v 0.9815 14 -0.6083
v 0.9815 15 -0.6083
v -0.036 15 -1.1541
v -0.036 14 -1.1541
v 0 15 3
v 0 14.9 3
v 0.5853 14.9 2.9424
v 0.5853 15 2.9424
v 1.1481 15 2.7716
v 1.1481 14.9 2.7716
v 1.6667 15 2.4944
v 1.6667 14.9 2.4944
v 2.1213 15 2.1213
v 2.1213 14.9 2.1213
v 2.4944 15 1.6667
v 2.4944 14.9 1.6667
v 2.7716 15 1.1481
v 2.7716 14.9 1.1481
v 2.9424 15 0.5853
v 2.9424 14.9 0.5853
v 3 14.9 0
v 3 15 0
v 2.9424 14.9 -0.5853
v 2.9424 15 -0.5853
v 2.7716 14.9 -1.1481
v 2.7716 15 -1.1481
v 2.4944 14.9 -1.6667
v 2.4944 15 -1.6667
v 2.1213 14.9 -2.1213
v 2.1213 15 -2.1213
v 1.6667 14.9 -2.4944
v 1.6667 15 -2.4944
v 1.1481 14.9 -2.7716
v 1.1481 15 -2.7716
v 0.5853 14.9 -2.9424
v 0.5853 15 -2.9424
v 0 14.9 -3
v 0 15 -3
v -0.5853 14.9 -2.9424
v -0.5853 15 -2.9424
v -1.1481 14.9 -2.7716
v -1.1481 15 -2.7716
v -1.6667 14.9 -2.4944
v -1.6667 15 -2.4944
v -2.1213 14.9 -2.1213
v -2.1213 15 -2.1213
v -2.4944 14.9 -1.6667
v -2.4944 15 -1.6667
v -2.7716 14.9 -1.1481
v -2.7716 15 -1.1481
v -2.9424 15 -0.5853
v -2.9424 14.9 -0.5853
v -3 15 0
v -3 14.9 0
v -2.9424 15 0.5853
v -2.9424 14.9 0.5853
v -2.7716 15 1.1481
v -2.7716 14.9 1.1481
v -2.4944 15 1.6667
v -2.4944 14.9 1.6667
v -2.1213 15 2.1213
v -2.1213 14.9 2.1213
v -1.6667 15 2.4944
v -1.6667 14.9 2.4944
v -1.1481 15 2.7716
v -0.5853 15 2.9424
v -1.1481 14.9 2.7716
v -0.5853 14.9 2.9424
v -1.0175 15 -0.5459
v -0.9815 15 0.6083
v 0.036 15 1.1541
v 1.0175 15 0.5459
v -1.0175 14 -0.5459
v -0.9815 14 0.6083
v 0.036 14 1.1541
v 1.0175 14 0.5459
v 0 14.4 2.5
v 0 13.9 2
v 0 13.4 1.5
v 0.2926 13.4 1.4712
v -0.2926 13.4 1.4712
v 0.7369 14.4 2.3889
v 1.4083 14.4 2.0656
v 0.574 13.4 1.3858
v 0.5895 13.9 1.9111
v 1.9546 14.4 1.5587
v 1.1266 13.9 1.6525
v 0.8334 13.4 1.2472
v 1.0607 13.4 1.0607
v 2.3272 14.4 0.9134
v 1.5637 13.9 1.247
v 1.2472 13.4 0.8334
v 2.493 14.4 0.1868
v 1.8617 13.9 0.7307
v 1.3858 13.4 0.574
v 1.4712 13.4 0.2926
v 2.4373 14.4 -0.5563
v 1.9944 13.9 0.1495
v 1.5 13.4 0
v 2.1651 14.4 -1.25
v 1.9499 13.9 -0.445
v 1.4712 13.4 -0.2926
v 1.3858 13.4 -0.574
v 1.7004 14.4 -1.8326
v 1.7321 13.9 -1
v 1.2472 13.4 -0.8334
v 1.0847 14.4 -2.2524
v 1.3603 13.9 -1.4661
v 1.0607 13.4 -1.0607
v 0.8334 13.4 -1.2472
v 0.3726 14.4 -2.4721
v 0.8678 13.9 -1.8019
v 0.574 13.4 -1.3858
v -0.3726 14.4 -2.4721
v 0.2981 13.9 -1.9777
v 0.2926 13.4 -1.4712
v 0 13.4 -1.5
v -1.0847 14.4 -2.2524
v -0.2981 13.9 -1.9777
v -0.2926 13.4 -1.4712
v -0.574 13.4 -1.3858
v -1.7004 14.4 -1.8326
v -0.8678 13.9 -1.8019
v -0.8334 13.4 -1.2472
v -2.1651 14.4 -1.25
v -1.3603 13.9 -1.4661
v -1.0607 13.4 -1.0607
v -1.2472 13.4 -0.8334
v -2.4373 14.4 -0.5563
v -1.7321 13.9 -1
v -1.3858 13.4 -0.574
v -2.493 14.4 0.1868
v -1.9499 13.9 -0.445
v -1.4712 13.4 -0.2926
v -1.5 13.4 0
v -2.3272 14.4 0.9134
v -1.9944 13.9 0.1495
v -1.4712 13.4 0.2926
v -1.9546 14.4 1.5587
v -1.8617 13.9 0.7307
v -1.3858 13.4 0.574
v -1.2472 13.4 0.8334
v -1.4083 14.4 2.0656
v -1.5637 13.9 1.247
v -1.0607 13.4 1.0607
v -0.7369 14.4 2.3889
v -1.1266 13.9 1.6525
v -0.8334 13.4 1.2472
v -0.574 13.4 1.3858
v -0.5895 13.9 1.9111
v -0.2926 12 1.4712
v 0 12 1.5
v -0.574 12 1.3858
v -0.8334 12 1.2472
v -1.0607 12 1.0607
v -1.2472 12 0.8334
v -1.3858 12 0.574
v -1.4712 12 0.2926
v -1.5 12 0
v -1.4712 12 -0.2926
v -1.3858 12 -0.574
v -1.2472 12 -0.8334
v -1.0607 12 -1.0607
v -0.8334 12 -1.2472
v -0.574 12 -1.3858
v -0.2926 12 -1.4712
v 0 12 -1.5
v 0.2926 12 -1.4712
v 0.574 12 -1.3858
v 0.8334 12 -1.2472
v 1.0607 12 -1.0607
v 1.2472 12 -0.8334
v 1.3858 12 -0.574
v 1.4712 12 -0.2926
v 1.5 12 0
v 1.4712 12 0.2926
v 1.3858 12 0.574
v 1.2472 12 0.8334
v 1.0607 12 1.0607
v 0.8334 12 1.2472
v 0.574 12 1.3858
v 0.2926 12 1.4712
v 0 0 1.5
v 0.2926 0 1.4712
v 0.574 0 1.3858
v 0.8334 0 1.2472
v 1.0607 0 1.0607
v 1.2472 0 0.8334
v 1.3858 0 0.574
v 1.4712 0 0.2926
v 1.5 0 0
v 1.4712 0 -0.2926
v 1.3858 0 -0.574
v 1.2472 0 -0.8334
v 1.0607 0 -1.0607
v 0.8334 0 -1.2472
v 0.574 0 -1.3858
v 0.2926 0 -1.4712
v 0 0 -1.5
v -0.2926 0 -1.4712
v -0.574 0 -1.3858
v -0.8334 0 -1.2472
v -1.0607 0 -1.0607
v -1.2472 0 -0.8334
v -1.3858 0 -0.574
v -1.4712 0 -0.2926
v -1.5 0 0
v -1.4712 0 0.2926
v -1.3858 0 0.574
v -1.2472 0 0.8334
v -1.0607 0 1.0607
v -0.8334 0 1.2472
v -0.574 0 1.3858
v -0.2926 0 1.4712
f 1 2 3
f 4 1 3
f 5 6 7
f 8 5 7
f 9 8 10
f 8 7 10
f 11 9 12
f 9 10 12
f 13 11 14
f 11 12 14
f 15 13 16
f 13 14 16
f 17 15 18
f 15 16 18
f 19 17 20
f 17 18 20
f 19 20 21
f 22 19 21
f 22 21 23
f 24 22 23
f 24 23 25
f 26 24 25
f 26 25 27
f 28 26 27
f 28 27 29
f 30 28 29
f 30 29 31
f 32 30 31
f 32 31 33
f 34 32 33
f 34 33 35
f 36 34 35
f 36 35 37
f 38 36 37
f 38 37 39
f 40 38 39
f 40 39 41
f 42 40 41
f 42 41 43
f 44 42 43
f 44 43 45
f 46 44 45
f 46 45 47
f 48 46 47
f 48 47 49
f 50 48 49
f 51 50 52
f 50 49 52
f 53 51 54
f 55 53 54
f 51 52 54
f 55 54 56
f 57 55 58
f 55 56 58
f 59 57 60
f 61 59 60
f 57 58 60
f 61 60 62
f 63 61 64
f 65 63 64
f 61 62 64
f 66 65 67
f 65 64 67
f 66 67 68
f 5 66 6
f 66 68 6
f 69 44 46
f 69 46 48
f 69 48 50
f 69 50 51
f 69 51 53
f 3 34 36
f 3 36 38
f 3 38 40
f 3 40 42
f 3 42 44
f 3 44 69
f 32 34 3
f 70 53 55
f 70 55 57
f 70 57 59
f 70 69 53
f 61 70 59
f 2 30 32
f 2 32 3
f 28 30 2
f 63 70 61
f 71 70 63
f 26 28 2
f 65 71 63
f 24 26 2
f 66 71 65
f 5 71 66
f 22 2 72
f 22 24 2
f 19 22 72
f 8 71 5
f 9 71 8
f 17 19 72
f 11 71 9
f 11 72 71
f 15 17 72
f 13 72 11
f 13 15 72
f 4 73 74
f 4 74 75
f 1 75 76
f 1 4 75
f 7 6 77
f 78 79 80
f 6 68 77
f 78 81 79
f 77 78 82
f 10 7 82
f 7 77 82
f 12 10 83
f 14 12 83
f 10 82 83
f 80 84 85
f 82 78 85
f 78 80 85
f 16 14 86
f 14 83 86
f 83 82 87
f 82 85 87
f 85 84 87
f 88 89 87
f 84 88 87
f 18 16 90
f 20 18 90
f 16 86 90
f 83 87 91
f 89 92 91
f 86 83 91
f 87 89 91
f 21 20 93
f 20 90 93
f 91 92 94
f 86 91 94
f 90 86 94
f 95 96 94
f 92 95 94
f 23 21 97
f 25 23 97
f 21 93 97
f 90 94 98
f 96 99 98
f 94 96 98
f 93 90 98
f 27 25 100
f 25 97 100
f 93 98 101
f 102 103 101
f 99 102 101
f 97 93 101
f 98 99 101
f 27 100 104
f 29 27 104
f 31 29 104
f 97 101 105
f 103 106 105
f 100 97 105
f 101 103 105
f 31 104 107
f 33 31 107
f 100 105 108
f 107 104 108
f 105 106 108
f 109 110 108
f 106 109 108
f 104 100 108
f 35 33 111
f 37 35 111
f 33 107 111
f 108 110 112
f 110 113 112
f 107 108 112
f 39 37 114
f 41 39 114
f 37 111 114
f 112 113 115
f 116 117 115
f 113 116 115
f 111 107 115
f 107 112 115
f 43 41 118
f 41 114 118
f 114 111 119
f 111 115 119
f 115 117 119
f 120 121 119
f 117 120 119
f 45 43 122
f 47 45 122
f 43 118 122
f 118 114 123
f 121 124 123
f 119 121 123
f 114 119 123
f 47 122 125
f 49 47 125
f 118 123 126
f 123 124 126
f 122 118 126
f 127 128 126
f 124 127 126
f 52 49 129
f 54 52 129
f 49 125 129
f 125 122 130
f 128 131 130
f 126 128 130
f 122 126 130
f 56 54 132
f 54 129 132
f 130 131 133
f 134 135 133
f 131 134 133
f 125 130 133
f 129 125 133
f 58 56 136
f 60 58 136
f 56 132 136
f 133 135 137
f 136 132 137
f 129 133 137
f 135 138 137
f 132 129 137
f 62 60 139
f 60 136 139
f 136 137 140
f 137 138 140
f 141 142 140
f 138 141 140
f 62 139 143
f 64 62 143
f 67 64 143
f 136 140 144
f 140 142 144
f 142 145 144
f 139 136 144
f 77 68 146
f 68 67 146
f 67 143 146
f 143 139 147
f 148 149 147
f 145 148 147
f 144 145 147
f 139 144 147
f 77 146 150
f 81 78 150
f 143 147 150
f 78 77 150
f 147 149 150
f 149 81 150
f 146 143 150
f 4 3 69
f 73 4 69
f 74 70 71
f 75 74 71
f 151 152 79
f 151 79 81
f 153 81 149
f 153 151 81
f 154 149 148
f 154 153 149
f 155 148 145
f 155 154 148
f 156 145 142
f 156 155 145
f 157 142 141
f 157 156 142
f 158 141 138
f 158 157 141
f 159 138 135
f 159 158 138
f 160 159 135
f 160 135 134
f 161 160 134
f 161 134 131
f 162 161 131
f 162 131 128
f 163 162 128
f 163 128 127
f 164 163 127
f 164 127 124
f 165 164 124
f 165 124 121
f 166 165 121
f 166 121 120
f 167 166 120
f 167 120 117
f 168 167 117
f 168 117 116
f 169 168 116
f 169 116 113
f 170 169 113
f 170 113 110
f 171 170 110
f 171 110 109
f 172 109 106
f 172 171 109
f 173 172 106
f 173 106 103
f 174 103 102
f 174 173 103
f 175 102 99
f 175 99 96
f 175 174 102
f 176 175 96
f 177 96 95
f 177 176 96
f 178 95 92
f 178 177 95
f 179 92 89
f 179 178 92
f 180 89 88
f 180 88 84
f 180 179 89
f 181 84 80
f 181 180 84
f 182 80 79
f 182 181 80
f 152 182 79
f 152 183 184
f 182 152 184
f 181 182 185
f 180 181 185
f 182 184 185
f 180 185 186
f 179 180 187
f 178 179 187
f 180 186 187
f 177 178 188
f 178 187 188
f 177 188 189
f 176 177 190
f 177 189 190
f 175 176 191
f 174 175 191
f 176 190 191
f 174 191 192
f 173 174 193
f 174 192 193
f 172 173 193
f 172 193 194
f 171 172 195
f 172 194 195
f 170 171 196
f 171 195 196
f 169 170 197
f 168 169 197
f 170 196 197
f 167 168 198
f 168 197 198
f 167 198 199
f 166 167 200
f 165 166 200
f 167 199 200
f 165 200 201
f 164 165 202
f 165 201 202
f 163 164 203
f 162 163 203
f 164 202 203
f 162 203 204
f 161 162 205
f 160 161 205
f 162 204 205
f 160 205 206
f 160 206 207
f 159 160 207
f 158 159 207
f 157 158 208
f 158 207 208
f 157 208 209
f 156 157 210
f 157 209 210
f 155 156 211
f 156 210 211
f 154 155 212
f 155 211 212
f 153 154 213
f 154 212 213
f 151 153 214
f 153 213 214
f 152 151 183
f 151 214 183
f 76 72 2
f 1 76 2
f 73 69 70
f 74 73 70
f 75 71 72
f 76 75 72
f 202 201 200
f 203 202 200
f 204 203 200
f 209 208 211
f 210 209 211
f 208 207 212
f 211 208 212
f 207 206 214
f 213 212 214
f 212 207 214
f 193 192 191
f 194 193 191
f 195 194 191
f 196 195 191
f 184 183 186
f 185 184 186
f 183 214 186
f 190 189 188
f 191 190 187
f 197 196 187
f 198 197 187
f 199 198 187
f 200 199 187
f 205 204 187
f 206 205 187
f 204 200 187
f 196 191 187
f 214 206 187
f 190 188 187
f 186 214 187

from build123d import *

# Parameters (mm, degrees)
SKETCH_1_R          = 1.5
EXTRUDE_1_DEPTH     = 12
SKETCH_2_R          = 3
EXTRUDE_2_DEPTH     = 3
CHAMFER_1_SIZE      = 2.9
CUT_EXTRUDE_1_DEPTH = 1


with BuildPart() as part:
    # 草图1 → 凸台-拉伸1 (new body)
    with BuildSketch(Plane(origin=(0, 0, 0), x_dir=(1, 0, 0), z_dir=(0, 1, 0))):
        with Locations(Location((0, 0, 0), (0, 0, 270))):
            Circle(SKETCH_1_R)
    extrude(amount=EXTRUDE_1_DEPTH)

    # 草图2 → 凸台-拉伸2 (add)
    with BuildSketch(Plane(origin=(0, 12, 0), x_dir=(1, 0, 0), z_dir=(0, 1, 0))):
        with Locations(Location((0, 0, 0), (0, 0, 270))):
            Circle(SKETCH_2_R)
    extrude(amount=EXTRUDE_2_DEPTH)

    # 倒角1
    # the kernel refuses this chamfer: 2.9 mm, written as the material it takes off along each edge
    with BuildSketch(Plane(origin=(0, 12, 0), x_dir=(0, 0, 1), z_dir=(-1, 0, 0))) as chamfer_1_piece_1_section:
        Polygon((3, CHAMFER_1_SIZE), (3 - CHAMFER_1_SIZE, 0), (3, 0), align=None)
    chamfer_1_piece_1 = revolve(axis=Axis((0, 12, 0), (0, 1, 0)), mode=Mode.PRIVATE)
    chamfer_1_piece_1 = chamfer_1_piece_1 - Plane(origin=(0, 14.16453564, 0), x_dir=(0, 0, 1), z_dir=(0, -1, 0)) * Cylinder(1.5, 12, mode=Mode.PRIVATE)
    add(chamfer_1_piece_1, mode=Mode.SUBTRACT)

    # 草图3 → 切除-拉伸1 (cut)
    with BuildSketch(Plane(origin=(0, 15, 0), x_dir=(1, 0, 0), z_dir=(0, 1, 0))):
        Polygon((1.017530084, -0.545862493), (0.981495828, 0.608275655), (-0.036034256, 1.154138148), (-1.017530084, 0.545862493), (-0.981495828, -0.608275655), (0.036034256, -1.154138148), align=None)
    extrude(amount=-CUT_EXTRUDE_1_DEPTH, mode=Mode.SUBTRACT)


solid = part.part
